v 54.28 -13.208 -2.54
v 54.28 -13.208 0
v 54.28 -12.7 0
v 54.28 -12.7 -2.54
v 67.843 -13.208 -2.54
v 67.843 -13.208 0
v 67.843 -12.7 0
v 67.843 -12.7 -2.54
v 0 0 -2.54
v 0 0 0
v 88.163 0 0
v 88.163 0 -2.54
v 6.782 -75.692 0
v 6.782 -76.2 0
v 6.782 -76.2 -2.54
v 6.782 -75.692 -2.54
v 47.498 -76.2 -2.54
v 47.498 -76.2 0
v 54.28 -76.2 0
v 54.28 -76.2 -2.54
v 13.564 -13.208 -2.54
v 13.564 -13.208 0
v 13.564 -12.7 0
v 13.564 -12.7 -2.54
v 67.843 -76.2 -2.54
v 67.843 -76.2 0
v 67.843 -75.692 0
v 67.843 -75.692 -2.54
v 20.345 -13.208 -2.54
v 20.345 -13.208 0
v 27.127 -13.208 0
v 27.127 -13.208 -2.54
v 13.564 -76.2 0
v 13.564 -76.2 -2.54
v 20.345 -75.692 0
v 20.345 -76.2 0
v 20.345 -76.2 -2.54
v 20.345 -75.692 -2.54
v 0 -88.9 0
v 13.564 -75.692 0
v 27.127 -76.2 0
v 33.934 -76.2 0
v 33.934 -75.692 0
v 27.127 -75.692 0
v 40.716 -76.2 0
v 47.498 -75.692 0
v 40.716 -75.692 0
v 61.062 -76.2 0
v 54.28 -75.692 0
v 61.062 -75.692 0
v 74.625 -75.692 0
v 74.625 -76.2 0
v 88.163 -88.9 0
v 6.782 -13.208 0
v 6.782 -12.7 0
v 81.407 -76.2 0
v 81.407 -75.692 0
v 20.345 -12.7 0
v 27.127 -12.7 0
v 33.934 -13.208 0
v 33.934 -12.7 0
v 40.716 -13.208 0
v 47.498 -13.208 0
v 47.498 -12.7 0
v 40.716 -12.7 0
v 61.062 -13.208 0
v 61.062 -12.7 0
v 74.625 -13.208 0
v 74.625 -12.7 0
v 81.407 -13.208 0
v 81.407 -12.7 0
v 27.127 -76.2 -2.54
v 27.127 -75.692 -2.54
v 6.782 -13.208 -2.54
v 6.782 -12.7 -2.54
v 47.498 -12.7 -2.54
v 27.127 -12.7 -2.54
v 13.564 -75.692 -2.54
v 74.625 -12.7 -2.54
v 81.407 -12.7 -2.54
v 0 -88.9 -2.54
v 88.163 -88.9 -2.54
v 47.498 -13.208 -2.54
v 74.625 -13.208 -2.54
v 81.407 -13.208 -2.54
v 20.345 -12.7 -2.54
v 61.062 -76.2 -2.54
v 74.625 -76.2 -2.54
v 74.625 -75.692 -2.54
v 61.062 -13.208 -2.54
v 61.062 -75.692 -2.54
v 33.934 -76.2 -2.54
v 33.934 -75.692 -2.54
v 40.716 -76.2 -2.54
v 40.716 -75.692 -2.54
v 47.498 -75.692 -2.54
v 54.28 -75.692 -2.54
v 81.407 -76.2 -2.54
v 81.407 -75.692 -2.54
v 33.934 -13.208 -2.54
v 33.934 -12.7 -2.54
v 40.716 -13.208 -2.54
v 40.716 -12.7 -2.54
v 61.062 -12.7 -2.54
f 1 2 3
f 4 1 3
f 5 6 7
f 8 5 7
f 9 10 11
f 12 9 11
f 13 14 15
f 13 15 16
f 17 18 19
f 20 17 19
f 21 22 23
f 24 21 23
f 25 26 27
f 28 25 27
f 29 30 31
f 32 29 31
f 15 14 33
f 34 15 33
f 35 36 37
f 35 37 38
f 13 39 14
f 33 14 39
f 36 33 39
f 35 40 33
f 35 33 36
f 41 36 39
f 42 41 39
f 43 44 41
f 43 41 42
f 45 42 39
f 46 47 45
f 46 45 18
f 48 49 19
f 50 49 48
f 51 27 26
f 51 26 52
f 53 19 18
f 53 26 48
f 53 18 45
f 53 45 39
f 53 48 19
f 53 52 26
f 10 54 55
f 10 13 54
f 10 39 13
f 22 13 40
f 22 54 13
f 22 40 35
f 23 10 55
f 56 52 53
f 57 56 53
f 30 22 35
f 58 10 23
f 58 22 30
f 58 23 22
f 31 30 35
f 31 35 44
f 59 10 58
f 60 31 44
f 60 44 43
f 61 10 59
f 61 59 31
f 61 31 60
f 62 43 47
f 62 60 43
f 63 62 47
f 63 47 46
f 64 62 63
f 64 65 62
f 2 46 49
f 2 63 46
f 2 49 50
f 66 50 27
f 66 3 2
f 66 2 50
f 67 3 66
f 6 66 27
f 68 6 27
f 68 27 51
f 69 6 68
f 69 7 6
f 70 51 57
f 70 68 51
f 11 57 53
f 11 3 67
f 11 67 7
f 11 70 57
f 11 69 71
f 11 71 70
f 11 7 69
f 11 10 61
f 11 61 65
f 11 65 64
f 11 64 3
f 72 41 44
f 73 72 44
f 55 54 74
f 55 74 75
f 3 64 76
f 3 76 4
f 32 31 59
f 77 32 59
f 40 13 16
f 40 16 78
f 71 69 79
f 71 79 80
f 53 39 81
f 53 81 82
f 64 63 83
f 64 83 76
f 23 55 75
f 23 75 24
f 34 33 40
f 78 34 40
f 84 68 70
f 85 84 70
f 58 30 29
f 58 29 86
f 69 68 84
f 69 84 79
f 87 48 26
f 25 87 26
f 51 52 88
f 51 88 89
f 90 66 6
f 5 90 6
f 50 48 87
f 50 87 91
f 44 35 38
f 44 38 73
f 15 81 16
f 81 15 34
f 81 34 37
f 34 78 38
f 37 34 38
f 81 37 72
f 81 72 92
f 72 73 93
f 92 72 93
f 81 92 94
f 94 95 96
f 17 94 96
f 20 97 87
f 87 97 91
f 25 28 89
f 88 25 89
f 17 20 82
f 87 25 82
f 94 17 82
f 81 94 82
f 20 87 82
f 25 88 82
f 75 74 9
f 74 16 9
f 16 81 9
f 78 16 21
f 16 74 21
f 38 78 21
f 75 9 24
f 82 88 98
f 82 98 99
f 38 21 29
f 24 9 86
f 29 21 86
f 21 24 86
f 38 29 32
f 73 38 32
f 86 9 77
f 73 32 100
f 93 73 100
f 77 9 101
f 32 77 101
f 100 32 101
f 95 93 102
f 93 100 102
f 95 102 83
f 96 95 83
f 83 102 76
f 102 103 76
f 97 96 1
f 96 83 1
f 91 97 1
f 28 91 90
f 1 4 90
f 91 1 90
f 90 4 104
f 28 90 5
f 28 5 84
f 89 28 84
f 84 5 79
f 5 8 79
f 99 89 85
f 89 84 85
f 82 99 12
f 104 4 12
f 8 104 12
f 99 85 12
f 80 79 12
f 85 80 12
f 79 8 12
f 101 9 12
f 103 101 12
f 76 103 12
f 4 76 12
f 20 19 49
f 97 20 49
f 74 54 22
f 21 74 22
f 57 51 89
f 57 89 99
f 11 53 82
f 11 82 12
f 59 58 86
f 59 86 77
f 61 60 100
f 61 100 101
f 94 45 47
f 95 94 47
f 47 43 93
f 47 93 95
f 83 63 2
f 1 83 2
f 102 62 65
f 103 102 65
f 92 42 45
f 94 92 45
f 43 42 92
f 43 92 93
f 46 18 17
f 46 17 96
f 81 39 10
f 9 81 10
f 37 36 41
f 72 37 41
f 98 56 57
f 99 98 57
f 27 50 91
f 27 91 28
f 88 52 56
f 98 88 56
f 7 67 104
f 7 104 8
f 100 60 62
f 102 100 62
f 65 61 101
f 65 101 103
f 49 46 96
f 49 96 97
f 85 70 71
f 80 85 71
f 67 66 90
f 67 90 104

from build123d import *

# Parameters (mm, degrees)
F0_W     = 88.1634
F0_H     = 88.9
F0_W_2   = 6.7818
F0_H_2   = 0.508
F1_DEPTH = 2.54


with BuildPart() as f1:
    # F0 (on Top) → F1 (new body)
    with BuildSketch(Plane.XY):
        with Locations((44.0817, -44.45)):
            Rectangle(F0_W, F0_H)
        with Locations((10.1727, -75.946)):
            Rectangle(F0_W_2, F0_H_2, mode=Mode.SUBTRACT)
        with Locations((23.7363, -75.946)):
            Rectangle(F0_W_2, F0_H_2, mode=Mode.SUBTRACT)
        with Locations((37.3253, -75.946)):
            Rectangle(F0_W_2, F0_H_2, mode=Mode.SUBTRACT)
        with Locations((50.8889, -75.946)):
            Rectangle(F0_W_2, F0_H_2, mode=Mode.SUBTRACT)
        with Locations((64.4525, -75.946)):
            Rectangle(F0_W_2, F0_H_2, mode=Mode.SUBTRACT)
        with Locations((78.0161, -75.946)):
            Rectangle(F0_W_2, F0_H_2, mode=Mode.SUBTRACT)
        with Locations((10.1727, -12.954)):
            Rectangle(F0_W_2, F0_H_2, mode=Mode.SUBTRACT)
        with Locations((23.7363, -12.954)):
            Rectangle(F0_W_2, F0_H_2, mode=Mode.SUBTRACT)
        with Locations((37.3253, -12.954)):
            Rectangle(F0_W_2, F0_H_2, mode=Mode.SUBTRACT)
        with Locations((50.8889, -12.954)):
            Rectangle(F0_W_2, F0_H_2, mode=Mode.SUBTRACT)
        with Locations((64.4525, -12.954)):
            Rectangle(F0_W_2, F0_H_2, mode=Mode.SUBTRACT)
        with Locations((78.0161, -12.954)):
            Rectangle(F0_W_2, F0_H_2, mode=Mode.SUBTRACT)
    extrude(amount=-F1_DEPTH)


solid = f1.part
